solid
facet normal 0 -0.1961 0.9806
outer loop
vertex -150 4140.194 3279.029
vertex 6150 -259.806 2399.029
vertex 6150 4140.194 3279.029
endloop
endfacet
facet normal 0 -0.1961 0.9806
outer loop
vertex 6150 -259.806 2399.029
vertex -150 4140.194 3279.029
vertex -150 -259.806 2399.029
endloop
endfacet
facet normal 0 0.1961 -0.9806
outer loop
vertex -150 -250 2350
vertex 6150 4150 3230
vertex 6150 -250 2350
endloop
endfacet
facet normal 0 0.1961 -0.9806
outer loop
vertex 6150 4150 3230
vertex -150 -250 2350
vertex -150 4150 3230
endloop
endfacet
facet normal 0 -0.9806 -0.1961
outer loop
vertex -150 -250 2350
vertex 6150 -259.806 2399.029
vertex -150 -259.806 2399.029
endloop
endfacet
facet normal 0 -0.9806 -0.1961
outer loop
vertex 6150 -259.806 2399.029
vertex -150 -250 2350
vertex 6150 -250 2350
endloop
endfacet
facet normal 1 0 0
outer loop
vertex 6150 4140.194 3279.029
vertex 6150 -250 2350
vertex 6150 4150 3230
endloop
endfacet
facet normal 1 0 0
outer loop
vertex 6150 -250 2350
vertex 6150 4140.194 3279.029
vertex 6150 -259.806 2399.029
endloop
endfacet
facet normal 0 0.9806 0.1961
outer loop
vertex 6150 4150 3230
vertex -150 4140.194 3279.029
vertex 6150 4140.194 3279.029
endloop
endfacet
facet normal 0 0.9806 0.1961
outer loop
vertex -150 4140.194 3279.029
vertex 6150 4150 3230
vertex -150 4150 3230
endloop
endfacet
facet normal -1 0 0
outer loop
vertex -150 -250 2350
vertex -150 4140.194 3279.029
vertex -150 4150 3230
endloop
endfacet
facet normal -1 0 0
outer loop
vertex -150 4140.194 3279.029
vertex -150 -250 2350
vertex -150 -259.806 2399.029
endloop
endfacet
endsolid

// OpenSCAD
// file: tea_shop_roof_parameters.scad
// =============================================================================
// Tea Shop — GROUP 2: ROOF PARAMETERS
// -----------------------------------------------------------------------------
// OpenSCAD native unit: 1 mm (1000 mm = 1.0 m). Real-life scale.
// Reuses Group 1 (Base & Shell) dimensions and shared global coordinate system:
//   +X -> left -> right  (building width along X, left wall at X = 0)
//   +Y -> front -> back  (building depth along Y, front eave at Y = 0)
//   +Z -> up             (ground / plinth datum = Z = 0)
// =============================================================================

// --- SHARED GLOBAL VARIABLES FROM GROUP 1 (identical values) -----------------
WALL_T             = 250;   // wall panel thickness                      (0.25 m)
BUILD_W            = 6000;  // building width along X, left -> right      (6.00 m)
BUILD_D            = 4000;  // building depth along Y, front eave -> back (4.00 m)
BACK_H             = 3200;  // full wall height at the BACK (tall side)   (3.20 m)
FRONT_H            = 2400;  // wall height at the FRONT eave (short side) (2.40 m)

// Aliases matching Group 1's tea_shop_parameters.scad naming convention
wall_thickness     = WALL_T;
building_width     = BUILD_W;
building_depth     = BUILD_D;
back_height        = BACK_H;
front_eave_height  = FRONT_H;

// --- GROUP 2: ROOF SLAB & OVERHANG PARAMETERS --------------------------------
ROOF_THICKNESS      = 50;   // structural substrate slab thickness       (0.05 m)
ROOF_OVERHANG_LEFT  = 150;  // overhang beyond outer face of left wall    (0.15 m)
ROOF_OVERHANG_RIGHT = 150;  // overhang beyond outer face of right wall   (0.15 m)
ROOF_OVERHANG_BACK  = 150;  // overhang beyond outer face of back wall    (0.15 m)
ROOF_OVERHANG_FRONT = 250;  // overhang forward past front eave wall      (0.25 m)
                            // (Estimated: in reference images, the tiled roof
                            //  terminates ~250mm past the front wall where the
                            //  pergola rafters tie in. Tune here if desired.)

// --- FASCIA / BARGEBOARD TRIM PARAMETERS ------------------------------------
FASCIA_THICKNESS    = 30;   // board thickness (along X for sides, Y for front)
FASCIA_WIDTH        = 100;  // board face height (normal to roof plane)

// --- TOP RIDGE CAPPING STRIP PARAMETERS -------------------------------------
// (Raised capping strip running along the highest back edge where roof meets
//  back wall, visible in wireframe and clay renders to seal top tile ends)
RIDGE_CAP_WIDTH     = 100;  // width / run of capping strip along slope   (0.10 m)
RIDGE_CAP_HEIGHT    = 35;   // raised bump height of capping strip        (0.035 m)

// --- TERRACOTTA ROOF TILE GEOMETRY PARAMETERS -------------------------------
// Shallow repeating barrel / curved ridges running down the slope direction
TILE_PITCH          = 175;  // center-to-center spacing along X between tile crests
TILE_WIDTH          = 120;  // width of each individual curved tile crest
TILE_HEIGHT         = 25;   // raised crest height of tile bump above slab
TILE_FN             = 16;   // polygon facets for lightweight STL export

// =============================================================================
// MATHEMATICAL SLOPE DERIVATION (Trig / Geometry)
// -----------------------------------------------------------------------------
// The monopitch lean-to roof connects the top of the short front wall (Z=FRONT_H
// at Y=0) to the top of the tall back wall (Z=BACK_H at Y=BUILD_D).
//
//   Vertical Rise : ROOF_RISE  = BACK_H - FRONT_H = 3200 - 2400 = 800 mm
//   Horizontal Run: ROOF_RUN   = BUILD_D = 4000 mm
//   Slope Tangent : tan(theta) = Rise / Run = 800 / 4000 = 0.20
//   Slope Angle   : ROOF_ANGLE = atan(0.20) ≈ 11.30993°
//
// Using the exact trigonometric angle prevents any height drift between the
// walls and the roof.
// =============================================================================
ROOF_RISE           = BACK_H - FRONT_H;
ROOF_RUN            = BUILD_D;
ROOF_ANGLE          = atan(ROOF_RISE / ROOF_RUN);

// Total projected extents:
ROOF_WIDTH          = BUILD_W + ROOF_OVERHANG_LEFT + ROOF_OVERHANG_RIGHT;
ROOF_DEPTH_PROJ     = BUILD_D + ROOF_OVERHANG_FRONT + ROOF_OVERHANG_BACK;

// True length along the sloped roof plane (hypotenuse of total run and rise):
ROOF_SLOPE_LEN      = ROOF_DEPTH_PROJ / cos(ROOF_ANGLE);

// Reference coordinate for the sloped roof frame:
// Origin at the lowest front-left corner of the sloped roof slab bottom face
ROOF_ORIGIN_X       = -ROOF_OVERHANG_LEFT;
ROOF_ORIGIN_Y       = -ROOF_OVERHANG_FRONT;
ROOF_ORIGIN_Z       = FRONT_H - ROOF_OVERHANG_FRONT * tan(ROOF_ANGLE);
// file: tea_shop_roof_modules.scad
// =============================================================================
// Tea Shop — GROUP 2: ROOF MODULE LIBRARY
// -----------------------------------------------------------------------------
// This file DEFINES all roof parts (and visual assemble() preview).
// It creates NO geometry on its own when included, allowing individual
// export parts (part_*.scad) and the assembly file to include it cleanly.
//
// SHARED GLOBAL COORDINATE SYSTEM:
//   +X -> left -> right  (0 = left wall outer face, BUILD_W = right wall)
//   +Y -> front -> back  (0 = front eave wall face, BUILD_D = back wall)
//   +Z -> up             (0 = plinth / porch floor datum)
//
// All parts are positioned in place so exported STLs align without manual transforms.
//
// TODO: The wooden pergola structure (posts, crossbeams, longitudinal purlins,
//       flat roof slats, and signboard brackets) is a separate upcoming group
//       and will attach along the front eave edge (Y = -ROOF_OVERHANG_FRONT to 0)
//       extending forward over the porch slab (-base_front_margin .. 0).
// =============================================================================

include <tea_shop_roof_parameters.scad>;

// -----------------------------------------------------------------------------
// _roof_transform — internal transformation helper.
// Translates to the lowest front-left corner of the roof slab bottom face
// (X = -ROOF_OVERHANG_LEFT, Y = -ROOF_OVERHANG_FRONT, Z = ROOF_ORIGIN_Z)
// and rotates around the X-axis by ROOF_ANGLE (pitch angle).
//
// In the child coordinate system:
//   local X : across roof width [0 .. ROOF_WIDTH]
//   local Y : along roof slope UP from front eave to back [0 .. ROOF_SLOPE_LEN]
//   local Z : normal (perpendicular) to the roof plane, pointing up [0 .. thickness]
// -----------------------------------------------------------------------------
module _roof_transform() {
    translate([ROOF_ORIGIN_X, ROOF_ORIGIN_Y, ROOF_ORIGIN_Z])
        rotate([ROOF_ANGLE, 0, 0])
            children();
}


// =============================================================================
// 1. roof_slab — the structural roof substrate.
// A flat slanted slab resting directly on top of the front, back, and side walls.
// Overhangs the building on left, right, and back, and projects forward past
// the front eave to shelter the front wall and meet the pergola frame.
// =============================================================================
module roof_slab() {
    _roof_transform()
        cube([ROOF_WIDTH, ROOF_SLOPE_LEN, ROOF_THICKNESS]);
}


// =============================================================================
// 2. ridge_cap_or_top_trim — raised cap strip along the high back edge.
// As confirmed in the wireframe (countryside-tea-shop-3d-model-9cc7378ff7.webp)
// and clay render (countryside-tea-shop-3d-model-4b97af2b49.webp), this is a
// raised half-round/chamfered capping strip running along the very top edge of
// the roof where it meets the tall back wall, sealing the tile ends against weather.
// =============================================================================
module _ridge_cap_profile_2d() {
    polygon(points = [
        [-RIDGE_CAP_WIDTH/2, 0],
        [-RIDGE_CAP_WIDTH*0.4, RIDGE_CAP_HEIGHT*0.7],
        [-RIDGE_CAP_WIDTH*0.2, RIDGE_CAP_HEIGHT*0.95],
        [ 0,                   RIDGE_CAP_HEIGHT],
        [ RIDGE_CAP_WIDTH*0.2, RIDGE_CAP_HEIGHT*0.95],
        [ RIDGE_CAP_WIDTH*0.4, RIDGE_CAP_HEIGHT*0.7],
        [ RIDGE_CAP_WIDTH/2, 0]
    ]);
}

module ridge_cap_or_top_trim() {
    _roof_transform() {
        translate([-FASCIA_THICKNESS, ROOF_SLOPE_LEN - RIDGE_CAP_WIDTH/2, ROOF_THICKNESS + TILE_HEIGHT])
            rotate([0, 90, 0])
                linear_extrude(height = ROOF_WIDTH + 2 * FASCIA_THICKNESS)
                    _ridge_cap_profile_2d();
    }
}


// =============================================================================
// 3. eave_fascia_left and eave_fascia_right — wooden trim boards running along
// the left and right sloped edges (rakes/verges) of the roof slab.
// Visible in textured renders as the dark timber strips along the outer roof edges.
// Covers both the slab edge and tile profile, extending slightly below the slab.
// =============================================================================
module eave_fascia_left() {
    _roof_transform() {
        translate([-FASCIA_THICKNESS, 0, -(FASCIA_WIDTH - ROOF_THICKNESS)/2])
            cube([FASCIA_THICKNESS, ROOF_SLOPE_LEN, FASCIA_WIDTH]);
    }
}

module eave_fascia_right() {
    _roof_transform() {
        translate([ROOF_WIDTH, 0, -(FASCIA_WIDTH - ROOF_THICKNESS)/2])
            cube([FASCIA_THICKNESS, ROOF_SLOPE_LEN, FASCIA_WIDTH]);
    }
}


// =============================================================================
// 4. eave_fascia_front — horizontal trim board running across the low front
// eave of the roof slab, immediately above where the pergola structure connects.
// =============================================================================
module eave_fascia_front() {
    _roof_transform() {
        translate([-FASCIA_THICKNESS, -FASCIA_THICKNESS, -(FASCIA_WIDTH - ROOF_THICKNESS)/2])
            cube([ROOF_WIDTH + 2 * FASCIA_THICKNESS, FASCIA_THICKNESS, FASCIA_WIDTH]);
    }
}


// =============================================================================
// 5. roof_tile_pattern — shallow repeating bump/ridge pattern on the top face
// of roof_slab(), representing the terracotta barrel tiles visible in the renders.
// Modeled as real geometry using lightweight 2D extruded curved crests running
// down the slope direction (local Y) and repeated along local X with a for loop.
// Parametric spacing (TILE_PITCH) and bump size (TILE_WIDTH, TILE_HEIGHT) allow
// tuning print resolution and file size.
// =============================================================================
module _tile_crest_2d() {
    polygon(points = [
        [-TILE_WIDTH * 0.50, 0],
        [-TILE_WIDTH * 0.42, TILE_HEIGHT * 0.50],
        [-TILE_WIDTH * 0.28, TILE_HEIGHT * 0.85],
        [0,                  TILE_HEIGHT],
        [ TILE_WIDTH * 0.28, TILE_HEIGHT * 0.85],
        [ TILE_WIDTH * 0.42, TILE_HEIGHT * 0.50],
        [ TILE_WIDTH * 0.50, 0]
    ]);
}

module roof_tile_pattern() {
    _roof_transform() {
        rotate([90, 0, 0])
        translate([0, ROOF_THICKNESS, -ROOF_SLOPE_LEN])
        linear_extrude(height = ROOF_SLOPE_LEN) {
            for (x = [TILE_PITCH/2 : TILE_PITCH : ROOF_WIDTH - TILE_PITCH/2]) {
                translate([x, 0, 0])
                    _tile_crest_2d();
            }
        }
    }
}


// =============================================================================
// assemble — visual verification assembly for Group 2 pieces (not for export).
// Displays each module in a distinct contrasting color.
// =============================================================================
module assemble() {
    color("Tan")          roof_slab();
    color("Chocolate")    roof_tile_pattern();
    color("DarkRed")      ridge_cap_or_top_trim();
    color("SaddleBrown")  eave_fascia_left();
    color("SaddleBrown")  eave_fascia_right();
    color("SaddleBrown")  eave_fascia_front();
}
// main file
// =============================================================================
// part_roof_slab.scad — export the STRUCTURAL ROOF SLAB only.
// Press F6 (render), then export as STL.
// Positioned in shared global coordinates to align automatically with Group 1.
// =============================================================================

include <tea_shop_roof_modules.scad>;

roof_slab();
